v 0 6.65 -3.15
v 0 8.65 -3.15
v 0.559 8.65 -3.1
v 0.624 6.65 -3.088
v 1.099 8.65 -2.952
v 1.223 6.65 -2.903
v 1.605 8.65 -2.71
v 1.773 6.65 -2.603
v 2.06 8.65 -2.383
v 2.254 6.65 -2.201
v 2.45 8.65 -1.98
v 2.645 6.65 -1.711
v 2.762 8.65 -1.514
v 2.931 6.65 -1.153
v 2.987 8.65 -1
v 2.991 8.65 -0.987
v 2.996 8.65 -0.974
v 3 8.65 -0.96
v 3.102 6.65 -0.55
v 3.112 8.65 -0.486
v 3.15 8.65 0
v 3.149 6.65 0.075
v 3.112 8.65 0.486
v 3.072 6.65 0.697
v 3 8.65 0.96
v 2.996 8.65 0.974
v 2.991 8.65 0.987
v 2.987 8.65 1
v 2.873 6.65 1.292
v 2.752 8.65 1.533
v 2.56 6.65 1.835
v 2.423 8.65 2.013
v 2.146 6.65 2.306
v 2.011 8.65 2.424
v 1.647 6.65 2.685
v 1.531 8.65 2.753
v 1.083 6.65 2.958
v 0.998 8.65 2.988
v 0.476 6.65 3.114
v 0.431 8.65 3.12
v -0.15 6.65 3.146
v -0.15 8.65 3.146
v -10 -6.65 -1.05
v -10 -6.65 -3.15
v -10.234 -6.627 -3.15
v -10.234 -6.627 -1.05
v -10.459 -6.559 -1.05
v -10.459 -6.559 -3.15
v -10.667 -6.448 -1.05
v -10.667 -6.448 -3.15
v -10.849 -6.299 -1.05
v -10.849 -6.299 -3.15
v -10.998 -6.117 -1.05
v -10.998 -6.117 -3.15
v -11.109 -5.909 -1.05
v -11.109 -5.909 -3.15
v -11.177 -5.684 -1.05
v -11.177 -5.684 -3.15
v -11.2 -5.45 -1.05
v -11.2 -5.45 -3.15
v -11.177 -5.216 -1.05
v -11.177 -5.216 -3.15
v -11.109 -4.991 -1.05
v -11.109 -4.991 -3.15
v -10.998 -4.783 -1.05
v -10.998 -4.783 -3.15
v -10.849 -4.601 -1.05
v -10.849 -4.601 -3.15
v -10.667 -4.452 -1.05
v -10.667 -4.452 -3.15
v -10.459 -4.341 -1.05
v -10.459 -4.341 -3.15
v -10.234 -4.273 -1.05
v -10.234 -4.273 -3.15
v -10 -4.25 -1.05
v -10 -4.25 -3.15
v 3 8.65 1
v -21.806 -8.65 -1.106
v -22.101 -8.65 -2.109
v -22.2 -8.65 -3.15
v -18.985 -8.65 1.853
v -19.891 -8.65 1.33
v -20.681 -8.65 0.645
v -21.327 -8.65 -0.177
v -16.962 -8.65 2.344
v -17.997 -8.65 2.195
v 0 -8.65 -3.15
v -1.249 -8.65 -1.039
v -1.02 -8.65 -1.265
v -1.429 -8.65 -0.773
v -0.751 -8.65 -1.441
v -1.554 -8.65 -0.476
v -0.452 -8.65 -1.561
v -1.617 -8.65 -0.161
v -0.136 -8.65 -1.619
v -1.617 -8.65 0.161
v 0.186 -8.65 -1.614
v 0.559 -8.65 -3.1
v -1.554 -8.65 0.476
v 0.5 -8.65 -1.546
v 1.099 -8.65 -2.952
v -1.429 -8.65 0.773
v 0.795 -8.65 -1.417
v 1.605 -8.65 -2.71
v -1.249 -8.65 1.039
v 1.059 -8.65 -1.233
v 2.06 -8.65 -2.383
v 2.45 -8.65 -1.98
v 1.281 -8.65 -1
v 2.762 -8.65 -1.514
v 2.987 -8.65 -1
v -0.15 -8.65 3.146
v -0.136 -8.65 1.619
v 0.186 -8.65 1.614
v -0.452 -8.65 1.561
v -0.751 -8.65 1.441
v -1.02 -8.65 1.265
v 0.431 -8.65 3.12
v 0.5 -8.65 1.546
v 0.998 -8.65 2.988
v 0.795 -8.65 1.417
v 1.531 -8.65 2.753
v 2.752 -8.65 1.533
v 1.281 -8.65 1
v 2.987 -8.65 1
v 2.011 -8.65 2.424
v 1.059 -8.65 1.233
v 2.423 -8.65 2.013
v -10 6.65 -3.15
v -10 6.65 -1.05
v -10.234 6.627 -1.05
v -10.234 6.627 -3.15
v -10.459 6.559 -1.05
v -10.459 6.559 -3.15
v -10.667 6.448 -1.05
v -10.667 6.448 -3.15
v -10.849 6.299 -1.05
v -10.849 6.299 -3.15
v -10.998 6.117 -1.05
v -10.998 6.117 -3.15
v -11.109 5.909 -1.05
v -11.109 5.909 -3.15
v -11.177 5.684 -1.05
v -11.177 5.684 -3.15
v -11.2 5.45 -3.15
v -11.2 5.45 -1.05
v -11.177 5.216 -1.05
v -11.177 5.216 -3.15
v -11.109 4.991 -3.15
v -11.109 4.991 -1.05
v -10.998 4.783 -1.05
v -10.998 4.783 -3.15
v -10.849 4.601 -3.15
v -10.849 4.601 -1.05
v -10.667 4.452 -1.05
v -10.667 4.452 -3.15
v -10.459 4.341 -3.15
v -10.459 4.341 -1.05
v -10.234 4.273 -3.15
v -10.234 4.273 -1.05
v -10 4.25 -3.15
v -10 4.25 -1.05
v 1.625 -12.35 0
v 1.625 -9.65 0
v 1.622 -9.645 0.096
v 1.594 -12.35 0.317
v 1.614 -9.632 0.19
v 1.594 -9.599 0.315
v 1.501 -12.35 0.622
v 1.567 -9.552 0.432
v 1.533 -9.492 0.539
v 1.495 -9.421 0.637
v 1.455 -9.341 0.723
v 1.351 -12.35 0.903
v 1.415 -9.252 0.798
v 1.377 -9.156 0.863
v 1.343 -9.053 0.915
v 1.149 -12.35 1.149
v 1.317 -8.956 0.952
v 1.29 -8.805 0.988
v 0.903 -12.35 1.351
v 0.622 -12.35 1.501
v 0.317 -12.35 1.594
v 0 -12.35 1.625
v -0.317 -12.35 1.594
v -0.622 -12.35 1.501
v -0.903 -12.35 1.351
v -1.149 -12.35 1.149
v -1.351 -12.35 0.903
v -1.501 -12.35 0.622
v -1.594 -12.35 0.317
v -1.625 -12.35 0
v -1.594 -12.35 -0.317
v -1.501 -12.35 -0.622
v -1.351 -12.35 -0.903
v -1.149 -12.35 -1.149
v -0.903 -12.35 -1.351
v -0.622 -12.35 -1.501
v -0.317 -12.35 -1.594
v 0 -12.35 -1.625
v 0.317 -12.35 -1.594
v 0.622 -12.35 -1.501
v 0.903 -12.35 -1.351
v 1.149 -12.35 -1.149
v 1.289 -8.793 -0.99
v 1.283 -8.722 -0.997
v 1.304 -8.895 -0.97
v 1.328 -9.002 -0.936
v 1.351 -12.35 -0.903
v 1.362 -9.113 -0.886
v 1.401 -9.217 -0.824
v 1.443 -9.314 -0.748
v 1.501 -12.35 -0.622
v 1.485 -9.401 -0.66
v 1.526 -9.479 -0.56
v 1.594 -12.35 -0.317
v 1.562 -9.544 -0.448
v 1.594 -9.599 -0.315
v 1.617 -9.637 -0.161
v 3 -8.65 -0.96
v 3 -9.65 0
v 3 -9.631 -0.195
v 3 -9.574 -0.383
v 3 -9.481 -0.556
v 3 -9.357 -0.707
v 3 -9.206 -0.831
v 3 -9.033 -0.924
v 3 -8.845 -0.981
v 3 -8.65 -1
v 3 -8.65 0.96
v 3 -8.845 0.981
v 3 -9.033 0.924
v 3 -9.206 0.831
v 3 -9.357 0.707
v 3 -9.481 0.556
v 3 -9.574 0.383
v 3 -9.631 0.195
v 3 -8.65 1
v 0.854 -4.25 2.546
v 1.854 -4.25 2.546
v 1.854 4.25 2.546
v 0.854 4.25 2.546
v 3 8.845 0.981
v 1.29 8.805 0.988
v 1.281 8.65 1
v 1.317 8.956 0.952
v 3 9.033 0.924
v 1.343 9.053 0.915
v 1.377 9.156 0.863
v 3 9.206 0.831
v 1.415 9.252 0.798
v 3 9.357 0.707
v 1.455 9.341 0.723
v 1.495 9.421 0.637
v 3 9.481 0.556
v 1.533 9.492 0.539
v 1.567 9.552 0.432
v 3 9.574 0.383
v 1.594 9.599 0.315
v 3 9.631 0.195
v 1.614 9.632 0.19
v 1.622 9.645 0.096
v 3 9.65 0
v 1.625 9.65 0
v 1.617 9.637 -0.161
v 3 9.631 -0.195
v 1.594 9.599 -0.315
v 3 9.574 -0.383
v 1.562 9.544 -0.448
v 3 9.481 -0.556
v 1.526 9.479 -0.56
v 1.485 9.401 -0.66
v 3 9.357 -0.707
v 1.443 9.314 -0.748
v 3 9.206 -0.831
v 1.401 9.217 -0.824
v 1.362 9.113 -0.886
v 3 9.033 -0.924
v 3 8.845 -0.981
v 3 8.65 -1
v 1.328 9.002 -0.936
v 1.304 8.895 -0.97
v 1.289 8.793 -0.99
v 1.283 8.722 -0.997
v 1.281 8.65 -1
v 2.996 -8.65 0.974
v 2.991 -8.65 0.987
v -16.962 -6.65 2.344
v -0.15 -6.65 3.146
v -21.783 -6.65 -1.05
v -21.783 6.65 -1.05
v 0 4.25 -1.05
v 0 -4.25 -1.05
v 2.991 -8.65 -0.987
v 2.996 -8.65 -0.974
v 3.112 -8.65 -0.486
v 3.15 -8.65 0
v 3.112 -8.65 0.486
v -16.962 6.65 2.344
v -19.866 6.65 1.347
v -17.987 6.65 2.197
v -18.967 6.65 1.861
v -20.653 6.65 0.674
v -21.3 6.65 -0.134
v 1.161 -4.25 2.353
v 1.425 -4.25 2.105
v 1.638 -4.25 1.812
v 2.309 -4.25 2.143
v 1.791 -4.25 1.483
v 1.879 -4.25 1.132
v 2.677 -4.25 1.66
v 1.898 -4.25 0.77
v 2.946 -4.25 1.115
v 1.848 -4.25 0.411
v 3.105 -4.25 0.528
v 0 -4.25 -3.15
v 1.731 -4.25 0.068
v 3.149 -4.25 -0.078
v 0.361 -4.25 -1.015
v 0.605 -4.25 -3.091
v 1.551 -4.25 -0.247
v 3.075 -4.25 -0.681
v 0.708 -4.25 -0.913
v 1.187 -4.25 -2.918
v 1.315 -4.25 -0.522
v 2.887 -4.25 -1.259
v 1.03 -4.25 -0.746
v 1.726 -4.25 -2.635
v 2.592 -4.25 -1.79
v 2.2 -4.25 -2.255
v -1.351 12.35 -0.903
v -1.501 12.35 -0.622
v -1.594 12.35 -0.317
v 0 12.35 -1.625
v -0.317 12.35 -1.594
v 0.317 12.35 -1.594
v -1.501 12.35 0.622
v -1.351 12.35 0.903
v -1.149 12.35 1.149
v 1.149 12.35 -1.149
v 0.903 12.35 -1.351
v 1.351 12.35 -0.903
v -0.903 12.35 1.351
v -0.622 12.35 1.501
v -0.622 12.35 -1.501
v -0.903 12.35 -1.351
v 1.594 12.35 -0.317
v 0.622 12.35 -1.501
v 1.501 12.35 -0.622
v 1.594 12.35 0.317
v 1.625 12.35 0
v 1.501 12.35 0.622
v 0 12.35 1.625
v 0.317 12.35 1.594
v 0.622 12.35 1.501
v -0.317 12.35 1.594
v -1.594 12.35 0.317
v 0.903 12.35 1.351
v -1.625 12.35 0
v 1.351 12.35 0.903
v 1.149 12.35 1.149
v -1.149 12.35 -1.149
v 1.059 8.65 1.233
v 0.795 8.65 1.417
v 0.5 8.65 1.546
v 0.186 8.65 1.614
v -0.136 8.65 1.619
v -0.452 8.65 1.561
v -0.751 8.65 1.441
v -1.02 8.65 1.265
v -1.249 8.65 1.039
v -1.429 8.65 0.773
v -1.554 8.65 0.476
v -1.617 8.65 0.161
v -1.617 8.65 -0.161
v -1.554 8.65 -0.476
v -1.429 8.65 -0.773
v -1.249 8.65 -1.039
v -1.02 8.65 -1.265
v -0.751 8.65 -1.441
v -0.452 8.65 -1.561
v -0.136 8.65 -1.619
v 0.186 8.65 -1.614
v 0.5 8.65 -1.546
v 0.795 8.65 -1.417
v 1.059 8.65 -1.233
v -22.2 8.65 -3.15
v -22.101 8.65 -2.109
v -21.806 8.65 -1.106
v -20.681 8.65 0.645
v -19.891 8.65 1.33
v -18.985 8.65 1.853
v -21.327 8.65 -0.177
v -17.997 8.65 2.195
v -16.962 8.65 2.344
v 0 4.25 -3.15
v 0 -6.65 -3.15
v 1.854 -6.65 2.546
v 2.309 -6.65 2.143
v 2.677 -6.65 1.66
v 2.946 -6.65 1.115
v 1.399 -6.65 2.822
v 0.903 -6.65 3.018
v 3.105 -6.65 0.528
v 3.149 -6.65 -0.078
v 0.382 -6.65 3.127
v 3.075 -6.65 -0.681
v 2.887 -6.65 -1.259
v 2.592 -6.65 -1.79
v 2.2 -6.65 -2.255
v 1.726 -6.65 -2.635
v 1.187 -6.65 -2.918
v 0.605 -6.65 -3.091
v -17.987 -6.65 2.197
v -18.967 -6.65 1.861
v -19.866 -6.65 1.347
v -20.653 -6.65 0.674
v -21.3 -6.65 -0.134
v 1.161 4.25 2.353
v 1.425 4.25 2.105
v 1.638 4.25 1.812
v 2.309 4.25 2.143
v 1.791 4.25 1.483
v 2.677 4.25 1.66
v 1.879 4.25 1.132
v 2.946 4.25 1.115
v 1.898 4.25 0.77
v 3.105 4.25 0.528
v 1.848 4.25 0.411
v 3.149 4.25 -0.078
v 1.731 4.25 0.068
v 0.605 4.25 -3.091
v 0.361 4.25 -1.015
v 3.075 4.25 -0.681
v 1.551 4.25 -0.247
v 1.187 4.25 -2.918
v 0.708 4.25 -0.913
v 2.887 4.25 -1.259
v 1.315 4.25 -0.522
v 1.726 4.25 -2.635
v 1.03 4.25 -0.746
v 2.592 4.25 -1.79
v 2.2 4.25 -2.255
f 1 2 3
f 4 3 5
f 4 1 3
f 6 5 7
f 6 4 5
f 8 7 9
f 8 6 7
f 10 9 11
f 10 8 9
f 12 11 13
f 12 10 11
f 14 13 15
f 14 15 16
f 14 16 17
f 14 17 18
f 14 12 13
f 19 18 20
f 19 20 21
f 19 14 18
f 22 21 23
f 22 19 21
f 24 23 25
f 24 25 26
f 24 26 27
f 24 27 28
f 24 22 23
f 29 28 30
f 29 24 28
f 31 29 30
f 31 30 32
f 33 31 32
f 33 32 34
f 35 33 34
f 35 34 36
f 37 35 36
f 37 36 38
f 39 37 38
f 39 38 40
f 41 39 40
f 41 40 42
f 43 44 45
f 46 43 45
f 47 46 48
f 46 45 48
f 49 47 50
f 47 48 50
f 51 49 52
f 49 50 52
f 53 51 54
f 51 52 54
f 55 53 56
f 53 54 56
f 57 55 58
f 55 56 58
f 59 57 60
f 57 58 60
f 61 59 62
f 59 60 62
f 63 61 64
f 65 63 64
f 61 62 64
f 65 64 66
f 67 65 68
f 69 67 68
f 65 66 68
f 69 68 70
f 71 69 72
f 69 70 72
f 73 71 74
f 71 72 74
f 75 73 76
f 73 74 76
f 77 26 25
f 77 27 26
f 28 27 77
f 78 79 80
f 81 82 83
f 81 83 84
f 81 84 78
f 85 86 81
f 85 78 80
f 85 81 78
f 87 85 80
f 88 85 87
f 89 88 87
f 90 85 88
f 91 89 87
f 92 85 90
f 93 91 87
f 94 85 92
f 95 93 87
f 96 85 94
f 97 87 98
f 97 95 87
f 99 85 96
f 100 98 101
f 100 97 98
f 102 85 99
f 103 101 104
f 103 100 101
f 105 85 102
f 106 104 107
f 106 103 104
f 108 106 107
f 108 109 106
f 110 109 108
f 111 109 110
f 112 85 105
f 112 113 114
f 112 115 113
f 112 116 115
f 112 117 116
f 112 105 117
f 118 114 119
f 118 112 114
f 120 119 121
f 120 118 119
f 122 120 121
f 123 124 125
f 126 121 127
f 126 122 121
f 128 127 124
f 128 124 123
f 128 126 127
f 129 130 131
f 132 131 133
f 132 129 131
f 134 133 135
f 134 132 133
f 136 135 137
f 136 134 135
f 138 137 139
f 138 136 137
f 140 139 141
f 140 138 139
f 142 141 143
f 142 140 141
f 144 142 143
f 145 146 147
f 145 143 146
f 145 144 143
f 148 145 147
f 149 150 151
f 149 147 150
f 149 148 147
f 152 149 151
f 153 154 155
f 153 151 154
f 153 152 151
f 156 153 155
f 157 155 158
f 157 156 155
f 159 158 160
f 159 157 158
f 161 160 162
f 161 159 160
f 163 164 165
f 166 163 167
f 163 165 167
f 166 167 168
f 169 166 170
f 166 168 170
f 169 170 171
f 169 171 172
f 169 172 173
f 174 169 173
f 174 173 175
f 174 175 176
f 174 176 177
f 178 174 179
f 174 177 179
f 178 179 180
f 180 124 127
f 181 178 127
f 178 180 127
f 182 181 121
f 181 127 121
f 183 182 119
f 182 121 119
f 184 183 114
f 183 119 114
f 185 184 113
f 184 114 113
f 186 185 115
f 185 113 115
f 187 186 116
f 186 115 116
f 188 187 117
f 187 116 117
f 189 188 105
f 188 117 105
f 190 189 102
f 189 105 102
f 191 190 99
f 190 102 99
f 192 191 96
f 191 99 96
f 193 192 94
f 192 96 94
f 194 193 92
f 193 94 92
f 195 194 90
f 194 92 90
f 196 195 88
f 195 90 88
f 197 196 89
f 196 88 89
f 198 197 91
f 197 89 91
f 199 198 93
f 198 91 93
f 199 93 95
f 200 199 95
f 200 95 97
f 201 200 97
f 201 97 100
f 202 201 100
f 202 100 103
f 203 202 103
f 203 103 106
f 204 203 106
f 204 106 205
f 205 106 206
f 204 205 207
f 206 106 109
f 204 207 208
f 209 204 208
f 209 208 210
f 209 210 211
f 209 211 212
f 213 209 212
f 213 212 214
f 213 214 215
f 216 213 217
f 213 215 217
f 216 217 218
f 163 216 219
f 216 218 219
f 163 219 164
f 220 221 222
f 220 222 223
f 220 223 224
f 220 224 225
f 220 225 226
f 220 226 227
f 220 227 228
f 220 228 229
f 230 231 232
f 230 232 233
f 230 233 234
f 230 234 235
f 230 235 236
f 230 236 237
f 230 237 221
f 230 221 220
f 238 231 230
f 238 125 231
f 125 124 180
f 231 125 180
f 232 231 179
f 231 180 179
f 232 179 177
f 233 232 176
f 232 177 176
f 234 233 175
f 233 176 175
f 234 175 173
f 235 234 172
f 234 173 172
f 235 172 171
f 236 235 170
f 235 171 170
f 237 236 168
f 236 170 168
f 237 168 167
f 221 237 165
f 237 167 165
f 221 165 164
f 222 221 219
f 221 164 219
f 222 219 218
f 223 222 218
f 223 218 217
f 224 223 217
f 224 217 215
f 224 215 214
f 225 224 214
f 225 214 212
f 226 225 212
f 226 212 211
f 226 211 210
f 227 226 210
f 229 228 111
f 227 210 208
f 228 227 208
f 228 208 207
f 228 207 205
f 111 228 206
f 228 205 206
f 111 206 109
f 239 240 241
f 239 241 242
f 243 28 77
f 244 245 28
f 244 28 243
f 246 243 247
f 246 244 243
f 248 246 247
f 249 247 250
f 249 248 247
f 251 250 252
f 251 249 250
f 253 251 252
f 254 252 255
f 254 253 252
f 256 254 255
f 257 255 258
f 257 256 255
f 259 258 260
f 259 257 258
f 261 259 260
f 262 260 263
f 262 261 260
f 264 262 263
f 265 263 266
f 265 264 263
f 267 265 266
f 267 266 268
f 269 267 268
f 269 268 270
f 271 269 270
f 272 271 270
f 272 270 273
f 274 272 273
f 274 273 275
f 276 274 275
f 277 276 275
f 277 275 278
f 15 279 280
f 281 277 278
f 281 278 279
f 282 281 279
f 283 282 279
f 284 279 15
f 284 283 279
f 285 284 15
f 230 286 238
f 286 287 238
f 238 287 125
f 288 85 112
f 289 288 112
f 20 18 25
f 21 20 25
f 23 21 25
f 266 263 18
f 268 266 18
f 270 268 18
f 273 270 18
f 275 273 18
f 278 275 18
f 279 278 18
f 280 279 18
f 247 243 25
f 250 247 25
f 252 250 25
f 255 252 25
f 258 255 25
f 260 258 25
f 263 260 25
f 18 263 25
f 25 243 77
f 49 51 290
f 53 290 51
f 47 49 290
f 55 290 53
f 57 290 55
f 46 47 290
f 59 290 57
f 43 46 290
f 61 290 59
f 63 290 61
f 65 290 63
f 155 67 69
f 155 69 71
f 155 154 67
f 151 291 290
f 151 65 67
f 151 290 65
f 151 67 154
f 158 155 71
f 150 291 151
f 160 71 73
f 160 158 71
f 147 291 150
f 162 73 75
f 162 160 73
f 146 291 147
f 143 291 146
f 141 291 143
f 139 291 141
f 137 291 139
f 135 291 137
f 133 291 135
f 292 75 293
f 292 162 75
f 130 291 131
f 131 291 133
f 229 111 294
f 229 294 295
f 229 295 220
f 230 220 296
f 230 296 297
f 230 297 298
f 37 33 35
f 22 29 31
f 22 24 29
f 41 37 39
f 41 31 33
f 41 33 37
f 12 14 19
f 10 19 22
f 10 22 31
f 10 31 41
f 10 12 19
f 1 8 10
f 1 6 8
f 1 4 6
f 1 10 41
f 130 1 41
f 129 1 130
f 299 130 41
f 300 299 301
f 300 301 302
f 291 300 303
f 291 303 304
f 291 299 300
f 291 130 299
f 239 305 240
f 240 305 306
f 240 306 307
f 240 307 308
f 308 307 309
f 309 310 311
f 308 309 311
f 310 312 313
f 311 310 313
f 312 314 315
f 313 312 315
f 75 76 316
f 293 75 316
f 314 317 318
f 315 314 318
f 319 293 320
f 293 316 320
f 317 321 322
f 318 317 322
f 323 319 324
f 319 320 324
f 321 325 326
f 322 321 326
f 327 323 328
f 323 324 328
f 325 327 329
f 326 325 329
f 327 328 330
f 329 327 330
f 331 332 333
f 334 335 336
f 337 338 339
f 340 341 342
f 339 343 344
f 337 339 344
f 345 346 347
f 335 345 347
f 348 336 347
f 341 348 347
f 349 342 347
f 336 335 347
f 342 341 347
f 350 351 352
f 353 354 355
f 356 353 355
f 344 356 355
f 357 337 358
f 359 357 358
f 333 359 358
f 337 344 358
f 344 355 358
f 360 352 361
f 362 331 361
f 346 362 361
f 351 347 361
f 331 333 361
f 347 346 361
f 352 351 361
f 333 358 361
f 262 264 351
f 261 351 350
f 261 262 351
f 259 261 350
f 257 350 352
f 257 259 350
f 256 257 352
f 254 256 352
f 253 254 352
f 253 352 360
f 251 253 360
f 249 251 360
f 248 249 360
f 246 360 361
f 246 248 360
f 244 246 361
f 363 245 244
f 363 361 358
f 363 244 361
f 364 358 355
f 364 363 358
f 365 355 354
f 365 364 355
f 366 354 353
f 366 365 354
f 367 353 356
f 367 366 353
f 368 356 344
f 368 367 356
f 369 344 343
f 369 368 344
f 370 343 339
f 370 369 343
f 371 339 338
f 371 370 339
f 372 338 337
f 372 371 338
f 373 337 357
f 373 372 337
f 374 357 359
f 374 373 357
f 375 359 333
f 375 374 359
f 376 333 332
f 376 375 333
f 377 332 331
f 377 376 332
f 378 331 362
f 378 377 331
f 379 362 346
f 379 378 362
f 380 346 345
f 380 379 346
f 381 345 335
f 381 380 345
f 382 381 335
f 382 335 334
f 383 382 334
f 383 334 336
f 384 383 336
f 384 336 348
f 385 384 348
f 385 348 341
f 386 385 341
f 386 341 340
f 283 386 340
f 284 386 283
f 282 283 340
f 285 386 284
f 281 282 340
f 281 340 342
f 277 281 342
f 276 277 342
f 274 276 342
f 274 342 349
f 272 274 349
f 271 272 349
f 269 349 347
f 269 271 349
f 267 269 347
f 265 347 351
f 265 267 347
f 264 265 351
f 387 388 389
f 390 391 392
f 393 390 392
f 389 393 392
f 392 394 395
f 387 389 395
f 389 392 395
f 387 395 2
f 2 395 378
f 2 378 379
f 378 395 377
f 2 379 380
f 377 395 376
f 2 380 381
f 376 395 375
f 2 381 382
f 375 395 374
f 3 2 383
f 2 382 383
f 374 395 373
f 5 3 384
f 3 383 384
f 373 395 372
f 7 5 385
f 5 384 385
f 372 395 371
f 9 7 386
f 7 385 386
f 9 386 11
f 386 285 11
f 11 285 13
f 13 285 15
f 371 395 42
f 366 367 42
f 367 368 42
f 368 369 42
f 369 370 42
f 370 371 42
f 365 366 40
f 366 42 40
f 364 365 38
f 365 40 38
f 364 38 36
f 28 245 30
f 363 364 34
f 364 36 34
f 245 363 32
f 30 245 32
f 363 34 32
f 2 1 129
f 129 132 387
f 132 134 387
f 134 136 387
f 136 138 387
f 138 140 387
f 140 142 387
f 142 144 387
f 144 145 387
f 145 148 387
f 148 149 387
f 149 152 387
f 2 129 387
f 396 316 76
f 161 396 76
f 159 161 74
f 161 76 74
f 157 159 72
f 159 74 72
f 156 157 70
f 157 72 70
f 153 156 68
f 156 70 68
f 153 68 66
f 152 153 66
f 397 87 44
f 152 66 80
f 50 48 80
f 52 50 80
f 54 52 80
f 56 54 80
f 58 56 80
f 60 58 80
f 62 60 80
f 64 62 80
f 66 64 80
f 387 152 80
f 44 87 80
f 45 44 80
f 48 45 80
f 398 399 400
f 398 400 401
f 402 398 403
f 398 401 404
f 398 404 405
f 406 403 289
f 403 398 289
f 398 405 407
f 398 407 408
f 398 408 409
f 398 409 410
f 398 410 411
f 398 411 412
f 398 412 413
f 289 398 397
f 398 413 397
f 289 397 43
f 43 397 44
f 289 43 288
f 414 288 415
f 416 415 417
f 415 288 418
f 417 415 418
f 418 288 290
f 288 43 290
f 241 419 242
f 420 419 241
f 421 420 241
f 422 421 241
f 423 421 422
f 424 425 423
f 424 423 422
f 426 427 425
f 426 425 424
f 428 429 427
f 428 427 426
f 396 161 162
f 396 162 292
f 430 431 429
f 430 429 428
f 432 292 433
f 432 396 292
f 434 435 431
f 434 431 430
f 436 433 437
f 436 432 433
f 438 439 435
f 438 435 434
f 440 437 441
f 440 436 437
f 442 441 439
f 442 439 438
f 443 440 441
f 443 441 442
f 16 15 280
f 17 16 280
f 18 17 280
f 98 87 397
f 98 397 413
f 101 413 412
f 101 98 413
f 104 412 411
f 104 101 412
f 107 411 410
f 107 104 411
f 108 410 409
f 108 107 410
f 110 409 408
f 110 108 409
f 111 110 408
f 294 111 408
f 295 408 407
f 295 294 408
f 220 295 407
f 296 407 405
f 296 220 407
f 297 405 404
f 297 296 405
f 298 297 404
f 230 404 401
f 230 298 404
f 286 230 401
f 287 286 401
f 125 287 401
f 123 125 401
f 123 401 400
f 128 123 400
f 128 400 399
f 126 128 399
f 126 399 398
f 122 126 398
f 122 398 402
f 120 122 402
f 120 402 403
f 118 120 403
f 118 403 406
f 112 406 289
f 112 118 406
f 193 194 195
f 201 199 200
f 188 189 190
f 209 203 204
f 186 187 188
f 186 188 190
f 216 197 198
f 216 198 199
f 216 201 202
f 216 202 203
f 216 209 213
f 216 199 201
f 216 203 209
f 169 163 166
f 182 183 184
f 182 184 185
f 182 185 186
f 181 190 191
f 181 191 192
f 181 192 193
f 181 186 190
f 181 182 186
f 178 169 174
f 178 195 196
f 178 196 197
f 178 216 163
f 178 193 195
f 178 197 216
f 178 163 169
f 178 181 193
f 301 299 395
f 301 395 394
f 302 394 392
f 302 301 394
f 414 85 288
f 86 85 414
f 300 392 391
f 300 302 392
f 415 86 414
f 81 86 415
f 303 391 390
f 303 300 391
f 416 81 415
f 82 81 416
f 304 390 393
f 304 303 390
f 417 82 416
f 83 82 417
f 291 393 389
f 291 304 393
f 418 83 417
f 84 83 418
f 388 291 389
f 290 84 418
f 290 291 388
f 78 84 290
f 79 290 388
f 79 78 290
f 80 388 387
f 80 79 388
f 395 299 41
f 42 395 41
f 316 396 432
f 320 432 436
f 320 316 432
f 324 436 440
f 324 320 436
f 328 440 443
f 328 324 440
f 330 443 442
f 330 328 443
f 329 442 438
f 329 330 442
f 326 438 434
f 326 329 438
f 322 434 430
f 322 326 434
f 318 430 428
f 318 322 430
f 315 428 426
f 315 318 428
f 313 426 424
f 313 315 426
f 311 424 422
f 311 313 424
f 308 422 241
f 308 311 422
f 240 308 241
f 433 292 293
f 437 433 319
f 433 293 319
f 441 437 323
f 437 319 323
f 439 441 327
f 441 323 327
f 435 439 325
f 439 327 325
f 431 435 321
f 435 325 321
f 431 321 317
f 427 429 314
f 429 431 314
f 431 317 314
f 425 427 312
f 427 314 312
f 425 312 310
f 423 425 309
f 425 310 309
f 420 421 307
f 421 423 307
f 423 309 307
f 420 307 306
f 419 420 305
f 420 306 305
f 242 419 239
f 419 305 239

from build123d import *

# Parameters (mm, degrees)
PAD_DEPTH       = 8.65
SKETCH001_R     = 1.625
PAD001_DEPTH    = 3.7
PAD002_DEPTH    = 3
POCKET_START    = -2
POCKET_DEPTH    = 8.3
POCKET001_DEPTH = 73.3327090398


with BuildPart() as part:
    # Sketch → Pad (new body, symmetric)
    with BuildSketch(Plane.XZ):
        with BuildLine():
            ThreePointArc((0, -3.15), (3.1491038588, 0.075132459), (-0.1502221693, 3.1464159451))
            Line((-16.9622926765, 2.3437421264), (-0.1502221693, 3.1464159451))
            ThreePointArc((-16.9622926765, 2.3437421264), (-20.6807417475, 0.6452200383), (-22.2, -3.15))
            Line((0, -3.15), (-22.2, -3.15))
        make_face()
    extrude(amount=PAD_DEPTH, both=True)

    # Sketch001 (on Face6 of Pad) → Pad001 (join)
    with BuildSketch(Plane.XZ.offset(8.65)):
        Circle(SKETCH001_R)
    pad001 = extrude(amount=PAD001_DEPTH)

    # Sketch002 → Pad002 (join)
    with BuildSketch(Plane.YZ):
        with BuildLine():
            ThreePointArc((-8.65, 1), (-9.65, 0), (-8.65, -1))
            Line((-8.65, -1), (-8.65, 1))
        make_face()
    pad002 = extrude(amount=PAD002_DEPTH)

    # Sketch003 (on Face5 of Pad002) → Pocket (cut)
    with BuildSketch(Plane.XZ.offset(8.65).offset(POCKET_START)):
        with BuildLine():
            Line((-21.7833060109, -1.05), (0, -1.05))
            ThreePointArc((0, -1.05), (1.8482397845, 0.4106515201), (0.8542561404, 2.5464159451))
            Line((1.8542561404, 2.5464159451), (0.8542561404, 2.5464159451))
            ThreePointArc((1.8542561404, 2.5464159451), (0.9032900662, 3.0177089085), (-0.1502221693, 3.1464159451))
            Line((-16.9622926765, 2.3437421264), (-0.1502221693, 3.1464159451))
            ThreePointArc((-16.9622926765, 2.3437421264), (-19.8659481576, 1.3474183998), (-21.7833060109, -1.05))
        make_face()
    pocket = extrude(amount=-POCKET_DEPTH, mode=Mode.SUBTRACT)

    # Sketch004 (on Face12 of Pocket) → Pocket001 (cut, through all)
    with BuildSketch(Plane(origin=(0, 0, -3.15), x_dir=(1, 0, 0), z_dir=(0, 0, -1))):
        with BuildLine():
            ThreePointArc((-10, 6.65), (-11.2, 5.45), (-10, 4.25))
            Line((-10, 4.25), (5, 4.25))
            Line((5, 4.25), (5, 6.65))
            Line((5, 6.65), (-10, 6.65))
        make_face()
    pocket001 = extrude(amount=-POCKET001_DEPTH, mode=Mode.SUBTRACT)

    # Mirrored: Pocket001, Pocket, Pad002, Pad001 across XZ
    add(pocket001.mirror(Plane.XZ), mode=Mode.SUBTRACT)
    add(pocket.mirror(Plane.XZ), mode=Mode.SUBTRACT)
    add(pad002.mirror(Plane.XZ))
    add(pad001.mirror(Plane.XZ))


solid = part.part
